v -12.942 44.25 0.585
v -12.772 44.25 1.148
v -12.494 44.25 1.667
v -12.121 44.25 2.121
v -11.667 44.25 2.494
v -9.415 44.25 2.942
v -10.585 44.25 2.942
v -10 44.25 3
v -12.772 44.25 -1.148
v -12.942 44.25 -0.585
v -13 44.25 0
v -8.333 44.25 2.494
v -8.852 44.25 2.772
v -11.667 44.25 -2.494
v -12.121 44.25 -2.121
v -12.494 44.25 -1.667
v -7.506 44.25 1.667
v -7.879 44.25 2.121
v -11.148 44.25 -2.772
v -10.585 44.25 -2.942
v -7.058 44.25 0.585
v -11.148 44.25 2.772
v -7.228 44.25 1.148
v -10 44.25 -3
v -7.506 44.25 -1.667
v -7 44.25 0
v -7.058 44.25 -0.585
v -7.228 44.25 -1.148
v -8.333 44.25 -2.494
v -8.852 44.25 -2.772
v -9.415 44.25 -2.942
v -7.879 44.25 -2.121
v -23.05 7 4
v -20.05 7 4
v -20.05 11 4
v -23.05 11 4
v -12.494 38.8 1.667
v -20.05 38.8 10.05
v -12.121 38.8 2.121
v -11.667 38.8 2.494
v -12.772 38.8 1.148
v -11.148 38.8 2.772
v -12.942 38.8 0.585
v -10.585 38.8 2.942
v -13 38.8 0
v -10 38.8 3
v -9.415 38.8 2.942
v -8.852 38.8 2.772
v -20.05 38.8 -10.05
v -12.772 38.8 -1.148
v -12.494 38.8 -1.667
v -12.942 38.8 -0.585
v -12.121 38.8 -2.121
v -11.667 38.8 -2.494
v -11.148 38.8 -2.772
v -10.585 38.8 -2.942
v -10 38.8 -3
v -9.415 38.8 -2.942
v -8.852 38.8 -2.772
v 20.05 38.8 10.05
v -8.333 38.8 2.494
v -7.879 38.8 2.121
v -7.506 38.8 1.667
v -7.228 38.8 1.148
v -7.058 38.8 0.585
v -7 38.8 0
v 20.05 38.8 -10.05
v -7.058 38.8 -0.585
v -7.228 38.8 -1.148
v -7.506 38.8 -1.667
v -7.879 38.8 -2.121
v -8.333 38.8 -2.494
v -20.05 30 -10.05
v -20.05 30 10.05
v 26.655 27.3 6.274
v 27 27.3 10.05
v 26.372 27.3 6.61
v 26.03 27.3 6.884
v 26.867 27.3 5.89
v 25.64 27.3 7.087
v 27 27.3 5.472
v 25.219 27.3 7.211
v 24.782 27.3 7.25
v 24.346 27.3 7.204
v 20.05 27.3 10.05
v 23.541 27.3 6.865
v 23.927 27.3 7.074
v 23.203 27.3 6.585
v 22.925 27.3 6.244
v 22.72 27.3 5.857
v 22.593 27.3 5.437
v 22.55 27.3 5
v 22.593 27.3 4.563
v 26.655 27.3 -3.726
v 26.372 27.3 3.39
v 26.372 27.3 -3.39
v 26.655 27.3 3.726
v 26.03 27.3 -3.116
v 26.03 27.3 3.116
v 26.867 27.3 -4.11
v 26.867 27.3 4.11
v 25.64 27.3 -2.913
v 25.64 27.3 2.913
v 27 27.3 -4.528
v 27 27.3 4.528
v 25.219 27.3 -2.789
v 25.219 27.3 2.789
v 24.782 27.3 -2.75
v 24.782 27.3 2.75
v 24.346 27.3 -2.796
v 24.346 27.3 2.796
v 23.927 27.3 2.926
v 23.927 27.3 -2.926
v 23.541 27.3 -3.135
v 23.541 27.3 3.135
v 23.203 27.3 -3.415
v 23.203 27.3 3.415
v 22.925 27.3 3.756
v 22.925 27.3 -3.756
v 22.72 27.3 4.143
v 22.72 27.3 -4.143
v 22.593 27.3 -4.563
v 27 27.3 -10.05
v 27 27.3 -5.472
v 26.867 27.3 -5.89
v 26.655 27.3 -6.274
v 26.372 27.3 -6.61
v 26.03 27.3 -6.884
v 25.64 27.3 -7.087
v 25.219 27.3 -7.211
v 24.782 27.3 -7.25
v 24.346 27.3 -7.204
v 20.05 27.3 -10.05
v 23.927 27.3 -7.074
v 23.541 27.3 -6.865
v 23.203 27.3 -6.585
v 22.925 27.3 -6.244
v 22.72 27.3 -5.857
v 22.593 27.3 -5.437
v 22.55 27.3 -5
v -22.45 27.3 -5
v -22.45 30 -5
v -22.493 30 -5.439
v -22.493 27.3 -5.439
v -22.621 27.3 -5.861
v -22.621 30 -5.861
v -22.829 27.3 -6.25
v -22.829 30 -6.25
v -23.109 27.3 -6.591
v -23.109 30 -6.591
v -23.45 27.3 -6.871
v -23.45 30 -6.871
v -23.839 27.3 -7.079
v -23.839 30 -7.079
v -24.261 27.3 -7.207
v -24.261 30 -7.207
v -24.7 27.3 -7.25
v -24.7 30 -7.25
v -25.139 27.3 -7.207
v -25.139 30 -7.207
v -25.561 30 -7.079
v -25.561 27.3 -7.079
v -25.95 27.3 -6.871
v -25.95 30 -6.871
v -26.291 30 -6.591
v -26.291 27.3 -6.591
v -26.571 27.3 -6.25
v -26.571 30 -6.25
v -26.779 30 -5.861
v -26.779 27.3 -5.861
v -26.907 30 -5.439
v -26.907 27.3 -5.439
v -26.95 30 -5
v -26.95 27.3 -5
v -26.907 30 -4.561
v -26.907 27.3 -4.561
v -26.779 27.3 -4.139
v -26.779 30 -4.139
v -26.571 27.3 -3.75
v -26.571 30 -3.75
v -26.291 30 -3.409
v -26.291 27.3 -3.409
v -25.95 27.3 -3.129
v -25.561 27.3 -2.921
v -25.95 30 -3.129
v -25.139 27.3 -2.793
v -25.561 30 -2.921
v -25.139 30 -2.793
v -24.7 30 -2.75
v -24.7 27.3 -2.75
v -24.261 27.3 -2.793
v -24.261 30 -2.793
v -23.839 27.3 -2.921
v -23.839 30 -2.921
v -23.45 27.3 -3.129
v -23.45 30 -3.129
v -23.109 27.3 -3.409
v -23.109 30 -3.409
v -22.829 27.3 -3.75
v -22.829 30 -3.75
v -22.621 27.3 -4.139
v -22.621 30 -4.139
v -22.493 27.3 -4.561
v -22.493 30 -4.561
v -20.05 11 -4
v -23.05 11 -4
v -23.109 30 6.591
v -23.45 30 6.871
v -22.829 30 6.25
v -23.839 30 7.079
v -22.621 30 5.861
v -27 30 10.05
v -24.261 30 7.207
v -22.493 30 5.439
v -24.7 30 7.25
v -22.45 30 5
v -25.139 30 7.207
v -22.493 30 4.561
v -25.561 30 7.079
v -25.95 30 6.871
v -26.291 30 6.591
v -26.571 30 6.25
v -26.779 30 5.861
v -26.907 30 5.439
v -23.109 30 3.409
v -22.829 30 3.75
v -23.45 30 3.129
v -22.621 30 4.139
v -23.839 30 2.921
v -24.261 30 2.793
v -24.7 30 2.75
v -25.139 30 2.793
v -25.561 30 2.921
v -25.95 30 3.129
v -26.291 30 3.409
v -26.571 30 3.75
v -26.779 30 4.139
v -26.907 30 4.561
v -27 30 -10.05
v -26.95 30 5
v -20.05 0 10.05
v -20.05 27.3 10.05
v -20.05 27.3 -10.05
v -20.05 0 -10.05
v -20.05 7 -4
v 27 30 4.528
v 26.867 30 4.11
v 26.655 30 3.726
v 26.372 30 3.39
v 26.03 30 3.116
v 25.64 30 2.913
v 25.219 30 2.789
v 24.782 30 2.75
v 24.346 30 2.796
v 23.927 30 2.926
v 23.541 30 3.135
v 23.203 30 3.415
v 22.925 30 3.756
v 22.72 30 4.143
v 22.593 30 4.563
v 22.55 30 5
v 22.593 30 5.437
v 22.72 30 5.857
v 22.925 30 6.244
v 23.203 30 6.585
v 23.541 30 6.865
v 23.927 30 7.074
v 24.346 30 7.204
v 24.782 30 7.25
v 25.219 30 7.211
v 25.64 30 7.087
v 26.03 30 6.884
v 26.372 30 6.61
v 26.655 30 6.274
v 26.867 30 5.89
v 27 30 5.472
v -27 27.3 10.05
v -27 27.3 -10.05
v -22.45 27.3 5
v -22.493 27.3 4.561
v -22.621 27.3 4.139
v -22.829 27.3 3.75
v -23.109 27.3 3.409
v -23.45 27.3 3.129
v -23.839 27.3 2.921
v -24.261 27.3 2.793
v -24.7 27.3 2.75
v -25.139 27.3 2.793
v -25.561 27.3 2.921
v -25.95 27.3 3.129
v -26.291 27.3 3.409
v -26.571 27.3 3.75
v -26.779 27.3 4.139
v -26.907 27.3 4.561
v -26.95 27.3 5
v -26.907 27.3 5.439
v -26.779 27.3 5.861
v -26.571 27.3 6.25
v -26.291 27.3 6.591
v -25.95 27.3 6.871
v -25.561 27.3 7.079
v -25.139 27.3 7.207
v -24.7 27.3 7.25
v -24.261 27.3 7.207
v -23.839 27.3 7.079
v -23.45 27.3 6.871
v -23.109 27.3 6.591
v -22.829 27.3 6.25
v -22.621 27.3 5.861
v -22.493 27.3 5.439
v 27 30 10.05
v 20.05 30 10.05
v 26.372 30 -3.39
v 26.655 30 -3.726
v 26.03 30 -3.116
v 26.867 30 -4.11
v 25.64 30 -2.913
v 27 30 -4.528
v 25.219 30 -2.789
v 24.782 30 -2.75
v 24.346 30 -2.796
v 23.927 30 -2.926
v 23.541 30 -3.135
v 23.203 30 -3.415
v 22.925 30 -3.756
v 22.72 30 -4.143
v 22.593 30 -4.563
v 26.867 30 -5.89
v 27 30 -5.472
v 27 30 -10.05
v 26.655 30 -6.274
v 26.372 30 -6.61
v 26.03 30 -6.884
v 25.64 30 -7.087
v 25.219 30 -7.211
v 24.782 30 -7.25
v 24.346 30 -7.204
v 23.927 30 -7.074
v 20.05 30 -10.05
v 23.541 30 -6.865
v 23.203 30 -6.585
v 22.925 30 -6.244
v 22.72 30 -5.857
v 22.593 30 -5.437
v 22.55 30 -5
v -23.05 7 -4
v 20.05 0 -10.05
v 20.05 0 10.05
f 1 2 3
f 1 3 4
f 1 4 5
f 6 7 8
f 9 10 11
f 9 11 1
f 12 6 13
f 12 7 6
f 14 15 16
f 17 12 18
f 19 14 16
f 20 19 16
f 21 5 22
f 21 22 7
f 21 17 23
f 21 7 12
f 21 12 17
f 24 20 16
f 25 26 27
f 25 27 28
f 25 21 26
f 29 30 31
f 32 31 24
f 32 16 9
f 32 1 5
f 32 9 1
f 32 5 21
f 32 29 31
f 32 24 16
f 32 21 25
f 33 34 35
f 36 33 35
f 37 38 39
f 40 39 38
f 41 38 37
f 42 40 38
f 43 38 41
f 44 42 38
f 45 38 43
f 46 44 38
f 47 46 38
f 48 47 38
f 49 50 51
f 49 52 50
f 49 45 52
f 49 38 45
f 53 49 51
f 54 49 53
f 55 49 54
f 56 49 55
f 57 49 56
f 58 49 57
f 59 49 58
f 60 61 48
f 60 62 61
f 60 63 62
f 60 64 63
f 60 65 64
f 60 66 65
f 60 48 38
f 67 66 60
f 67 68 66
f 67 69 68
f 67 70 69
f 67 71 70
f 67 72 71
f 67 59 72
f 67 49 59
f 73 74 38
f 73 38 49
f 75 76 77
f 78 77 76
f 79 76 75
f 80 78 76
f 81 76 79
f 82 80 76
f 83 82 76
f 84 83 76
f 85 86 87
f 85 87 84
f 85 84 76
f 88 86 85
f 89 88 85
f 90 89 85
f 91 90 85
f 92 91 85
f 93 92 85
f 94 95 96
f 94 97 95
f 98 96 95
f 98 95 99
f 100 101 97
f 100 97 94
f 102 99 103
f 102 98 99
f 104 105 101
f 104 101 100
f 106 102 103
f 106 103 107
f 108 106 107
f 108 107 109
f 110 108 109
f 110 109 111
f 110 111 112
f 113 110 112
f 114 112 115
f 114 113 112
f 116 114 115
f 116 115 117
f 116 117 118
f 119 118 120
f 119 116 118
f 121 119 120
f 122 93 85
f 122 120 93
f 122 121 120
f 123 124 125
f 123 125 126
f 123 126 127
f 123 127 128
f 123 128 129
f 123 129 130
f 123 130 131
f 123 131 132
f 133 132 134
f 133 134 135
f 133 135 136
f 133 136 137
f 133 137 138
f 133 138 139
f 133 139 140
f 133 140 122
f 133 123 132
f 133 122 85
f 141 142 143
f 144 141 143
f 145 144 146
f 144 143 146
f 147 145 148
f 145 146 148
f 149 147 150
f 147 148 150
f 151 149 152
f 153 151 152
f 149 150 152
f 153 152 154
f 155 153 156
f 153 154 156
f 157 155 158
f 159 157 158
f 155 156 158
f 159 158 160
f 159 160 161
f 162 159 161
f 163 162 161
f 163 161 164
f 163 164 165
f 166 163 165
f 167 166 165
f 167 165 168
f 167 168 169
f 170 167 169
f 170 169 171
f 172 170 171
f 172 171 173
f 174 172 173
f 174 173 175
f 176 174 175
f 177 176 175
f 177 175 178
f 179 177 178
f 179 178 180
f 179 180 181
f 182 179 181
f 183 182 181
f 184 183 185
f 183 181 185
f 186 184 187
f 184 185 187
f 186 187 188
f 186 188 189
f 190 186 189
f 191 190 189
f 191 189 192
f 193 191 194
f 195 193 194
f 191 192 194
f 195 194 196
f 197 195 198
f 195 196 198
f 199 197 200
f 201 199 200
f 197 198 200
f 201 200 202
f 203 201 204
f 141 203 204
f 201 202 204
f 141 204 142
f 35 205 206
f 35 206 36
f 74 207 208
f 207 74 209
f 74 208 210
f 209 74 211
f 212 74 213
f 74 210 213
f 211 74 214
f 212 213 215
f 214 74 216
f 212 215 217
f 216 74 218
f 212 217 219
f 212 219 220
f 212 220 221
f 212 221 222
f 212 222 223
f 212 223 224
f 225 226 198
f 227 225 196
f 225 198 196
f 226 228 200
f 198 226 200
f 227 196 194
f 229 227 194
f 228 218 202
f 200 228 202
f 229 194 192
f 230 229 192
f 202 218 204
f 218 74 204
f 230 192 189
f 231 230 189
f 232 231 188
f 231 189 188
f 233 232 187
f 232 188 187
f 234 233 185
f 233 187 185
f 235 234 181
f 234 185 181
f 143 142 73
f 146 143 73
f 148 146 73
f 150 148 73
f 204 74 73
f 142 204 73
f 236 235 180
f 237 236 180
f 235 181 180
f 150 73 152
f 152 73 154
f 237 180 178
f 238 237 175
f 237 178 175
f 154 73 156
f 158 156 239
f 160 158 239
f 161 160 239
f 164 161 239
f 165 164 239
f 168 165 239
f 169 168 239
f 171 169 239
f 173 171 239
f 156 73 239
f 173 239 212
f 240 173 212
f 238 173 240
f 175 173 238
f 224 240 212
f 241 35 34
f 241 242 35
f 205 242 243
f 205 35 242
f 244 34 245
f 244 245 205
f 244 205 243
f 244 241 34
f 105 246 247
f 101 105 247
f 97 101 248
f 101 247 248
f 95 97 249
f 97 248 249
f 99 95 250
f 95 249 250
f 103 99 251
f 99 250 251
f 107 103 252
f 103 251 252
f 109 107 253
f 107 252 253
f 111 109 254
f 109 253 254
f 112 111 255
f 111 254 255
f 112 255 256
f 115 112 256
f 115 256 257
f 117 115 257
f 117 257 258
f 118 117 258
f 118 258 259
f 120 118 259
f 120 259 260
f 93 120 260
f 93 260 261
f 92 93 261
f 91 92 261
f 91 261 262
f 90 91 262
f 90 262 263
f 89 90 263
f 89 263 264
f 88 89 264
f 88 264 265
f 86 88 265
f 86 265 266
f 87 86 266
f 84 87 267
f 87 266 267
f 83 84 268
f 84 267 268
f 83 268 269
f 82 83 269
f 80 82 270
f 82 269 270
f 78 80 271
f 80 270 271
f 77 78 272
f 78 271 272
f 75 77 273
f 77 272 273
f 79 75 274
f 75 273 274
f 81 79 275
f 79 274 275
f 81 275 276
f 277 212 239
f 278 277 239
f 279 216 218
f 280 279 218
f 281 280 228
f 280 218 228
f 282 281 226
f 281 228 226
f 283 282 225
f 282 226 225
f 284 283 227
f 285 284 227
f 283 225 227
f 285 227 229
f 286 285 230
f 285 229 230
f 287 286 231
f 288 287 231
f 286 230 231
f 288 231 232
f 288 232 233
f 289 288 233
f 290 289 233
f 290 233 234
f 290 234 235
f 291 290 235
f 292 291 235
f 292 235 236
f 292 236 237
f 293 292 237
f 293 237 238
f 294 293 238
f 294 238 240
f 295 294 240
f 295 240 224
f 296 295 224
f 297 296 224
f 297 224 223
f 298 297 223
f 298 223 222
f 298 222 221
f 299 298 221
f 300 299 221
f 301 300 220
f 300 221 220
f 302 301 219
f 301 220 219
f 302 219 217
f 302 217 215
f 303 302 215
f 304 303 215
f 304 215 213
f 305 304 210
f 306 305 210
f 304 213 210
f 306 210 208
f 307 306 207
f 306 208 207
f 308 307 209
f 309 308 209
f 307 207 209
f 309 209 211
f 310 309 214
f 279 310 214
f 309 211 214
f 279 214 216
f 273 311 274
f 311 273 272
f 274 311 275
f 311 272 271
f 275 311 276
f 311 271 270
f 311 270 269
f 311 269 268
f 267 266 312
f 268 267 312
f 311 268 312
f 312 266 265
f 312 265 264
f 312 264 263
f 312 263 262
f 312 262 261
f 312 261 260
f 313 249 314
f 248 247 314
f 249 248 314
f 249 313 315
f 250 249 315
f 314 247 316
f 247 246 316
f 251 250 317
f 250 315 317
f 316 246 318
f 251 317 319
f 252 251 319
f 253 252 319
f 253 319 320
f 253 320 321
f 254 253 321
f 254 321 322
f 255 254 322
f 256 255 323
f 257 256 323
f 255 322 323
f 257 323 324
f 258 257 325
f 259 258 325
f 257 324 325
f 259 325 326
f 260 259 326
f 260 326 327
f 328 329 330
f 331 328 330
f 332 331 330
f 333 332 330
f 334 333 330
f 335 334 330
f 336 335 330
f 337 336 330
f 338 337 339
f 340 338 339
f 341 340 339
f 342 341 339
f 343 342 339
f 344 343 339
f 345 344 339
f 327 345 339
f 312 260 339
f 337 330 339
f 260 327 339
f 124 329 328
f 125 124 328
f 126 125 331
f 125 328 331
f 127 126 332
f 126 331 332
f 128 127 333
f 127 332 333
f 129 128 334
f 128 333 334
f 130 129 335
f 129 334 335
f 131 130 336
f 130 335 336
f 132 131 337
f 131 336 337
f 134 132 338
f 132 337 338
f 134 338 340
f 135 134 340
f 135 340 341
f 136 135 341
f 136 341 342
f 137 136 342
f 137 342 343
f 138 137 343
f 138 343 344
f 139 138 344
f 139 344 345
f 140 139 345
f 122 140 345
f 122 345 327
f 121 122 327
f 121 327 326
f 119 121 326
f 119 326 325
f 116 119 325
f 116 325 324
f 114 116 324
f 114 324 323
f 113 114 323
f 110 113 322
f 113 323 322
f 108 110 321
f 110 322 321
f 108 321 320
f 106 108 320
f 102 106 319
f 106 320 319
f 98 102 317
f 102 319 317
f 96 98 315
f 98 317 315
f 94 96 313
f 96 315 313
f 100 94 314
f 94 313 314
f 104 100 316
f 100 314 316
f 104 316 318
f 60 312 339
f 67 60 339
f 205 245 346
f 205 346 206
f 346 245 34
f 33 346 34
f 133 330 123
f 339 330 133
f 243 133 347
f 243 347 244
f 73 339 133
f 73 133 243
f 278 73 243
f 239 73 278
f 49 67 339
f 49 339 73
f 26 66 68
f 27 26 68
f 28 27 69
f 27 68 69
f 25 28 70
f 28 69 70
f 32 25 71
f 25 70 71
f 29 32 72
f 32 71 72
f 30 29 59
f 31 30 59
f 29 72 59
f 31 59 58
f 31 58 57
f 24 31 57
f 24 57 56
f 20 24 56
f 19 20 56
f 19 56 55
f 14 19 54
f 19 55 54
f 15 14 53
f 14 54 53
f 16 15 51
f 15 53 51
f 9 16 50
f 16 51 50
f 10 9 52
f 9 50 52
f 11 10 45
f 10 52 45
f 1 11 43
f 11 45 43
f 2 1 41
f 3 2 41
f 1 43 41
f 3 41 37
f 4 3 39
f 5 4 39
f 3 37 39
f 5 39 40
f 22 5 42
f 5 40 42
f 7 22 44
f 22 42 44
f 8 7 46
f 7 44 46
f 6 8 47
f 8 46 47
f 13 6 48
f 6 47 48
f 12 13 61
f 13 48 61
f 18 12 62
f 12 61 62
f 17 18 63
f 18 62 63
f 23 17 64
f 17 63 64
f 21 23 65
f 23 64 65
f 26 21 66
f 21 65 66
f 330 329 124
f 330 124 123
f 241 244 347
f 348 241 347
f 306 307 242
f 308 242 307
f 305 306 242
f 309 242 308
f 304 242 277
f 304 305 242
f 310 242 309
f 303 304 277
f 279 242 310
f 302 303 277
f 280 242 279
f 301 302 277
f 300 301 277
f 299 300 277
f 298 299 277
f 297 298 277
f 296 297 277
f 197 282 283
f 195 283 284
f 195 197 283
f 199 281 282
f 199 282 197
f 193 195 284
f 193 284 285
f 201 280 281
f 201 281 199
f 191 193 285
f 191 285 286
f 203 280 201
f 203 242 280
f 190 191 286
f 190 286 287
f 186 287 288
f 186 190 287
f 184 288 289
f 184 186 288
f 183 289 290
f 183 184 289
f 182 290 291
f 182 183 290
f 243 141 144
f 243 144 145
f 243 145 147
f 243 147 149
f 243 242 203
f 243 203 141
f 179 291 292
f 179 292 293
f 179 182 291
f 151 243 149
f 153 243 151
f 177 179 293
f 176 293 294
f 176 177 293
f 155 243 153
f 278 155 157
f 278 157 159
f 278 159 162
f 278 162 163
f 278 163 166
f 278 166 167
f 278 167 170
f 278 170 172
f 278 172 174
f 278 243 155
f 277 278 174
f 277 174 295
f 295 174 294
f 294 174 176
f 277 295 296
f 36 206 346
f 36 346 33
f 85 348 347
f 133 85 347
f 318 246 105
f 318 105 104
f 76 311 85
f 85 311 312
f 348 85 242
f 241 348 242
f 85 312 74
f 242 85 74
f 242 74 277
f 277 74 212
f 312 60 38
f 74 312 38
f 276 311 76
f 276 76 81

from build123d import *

# Parameters (mm, degrees)
SKETCH_1_W          = 40.1
SKETCH_1_H          = 20.1
EXTRUDE_2_DEPTH     = 38.8
SKETCH_2_W          = 54
SKETCH_2_H          = 20.1
EXTRUDE_3_DEPTH     = 2.7
SKETCH_4_R          = 3
EXTRUDE_4_DEPTH     = 5.45
SKETCH_5_R          = 2.25
CUT_EXTRUDE_1_DEPTH = 31
SKETCH_6_W          = 8
SKETCH_6_H          = 4
EXTRUDE_5_DEPTH     = 3


with BuildPart() as part:
    # ｽｹｯﾁ1 → ﾎﾞｽ - 押し出し2 (new body)
    with BuildSketch(Plane(origin=(0, 0, 0), x_dir=(1, 0, 0), z_dir=(0, 1, 0))):
        Rectangle(SKETCH_1_W, SKETCH_1_H)
    extrude(amount=EXTRUDE_2_DEPTH)

    # ｽｹｯﾁ2 → ﾎﾞｽ - 押し出し3 (add)
    with BuildSketch(Plane(origin=(0, 30, 0), x_dir=(-1, 0, 0), z_dir=(0, -1, 0))):
        Rectangle(SKETCH_2_W, SKETCH_2_H)
    extrude(amount=EXTRUDE_3_DEPTH)

    # ｽｹｯﾁ4 → ﾎﾞｽ - 押し出し4 (add)
    with BuildSketch(Plane(origin=(0, 38.8, 0), x_dir=(1, 0, 0), z_dir=(0, 1, 0))):
        with Locations((-10, 0)):
            Circle(SKETCH_4_R)
    extrude(amount=EXTRUDE_4_DEPTH)

    # ｽｹｯﾁ5 → ｶｯﾄ - 押し出し1 (cut, through all)
    with BuildSketch(Plane(origin=(0, 30, 0), x_dir=(1, 0, 0), z_dir=(0, 1, 0))):
        with Locations((24.8, 5)):
            Circle(SKETCH_5_R)
        with Locations((24.8, -5)):
            Circle(SKETCH_5_R)
        with Locations((-24.7, 5)):
            Circle(SKETCH_5_R)
        with Locations((-24.7, -5)):
            Circle(SKETCH_5_R)
    extrude(amount=-CUT_EXTRUDE_1_DEPTH, mode=Mode.SUBTRACT)

    # ｽｹｯﾁ6 → ﾎﾞｽ - 押し出し5 (add)
    with BuildSketch(Plane.ZY.offset(20.05)):
        with Locations((0, 9)):
            Rectangle(SKETCH_6_W, SKETCH_6_H)
    extrude(amount=EXTRUDE_5_DEPTH)


solid = part.part
